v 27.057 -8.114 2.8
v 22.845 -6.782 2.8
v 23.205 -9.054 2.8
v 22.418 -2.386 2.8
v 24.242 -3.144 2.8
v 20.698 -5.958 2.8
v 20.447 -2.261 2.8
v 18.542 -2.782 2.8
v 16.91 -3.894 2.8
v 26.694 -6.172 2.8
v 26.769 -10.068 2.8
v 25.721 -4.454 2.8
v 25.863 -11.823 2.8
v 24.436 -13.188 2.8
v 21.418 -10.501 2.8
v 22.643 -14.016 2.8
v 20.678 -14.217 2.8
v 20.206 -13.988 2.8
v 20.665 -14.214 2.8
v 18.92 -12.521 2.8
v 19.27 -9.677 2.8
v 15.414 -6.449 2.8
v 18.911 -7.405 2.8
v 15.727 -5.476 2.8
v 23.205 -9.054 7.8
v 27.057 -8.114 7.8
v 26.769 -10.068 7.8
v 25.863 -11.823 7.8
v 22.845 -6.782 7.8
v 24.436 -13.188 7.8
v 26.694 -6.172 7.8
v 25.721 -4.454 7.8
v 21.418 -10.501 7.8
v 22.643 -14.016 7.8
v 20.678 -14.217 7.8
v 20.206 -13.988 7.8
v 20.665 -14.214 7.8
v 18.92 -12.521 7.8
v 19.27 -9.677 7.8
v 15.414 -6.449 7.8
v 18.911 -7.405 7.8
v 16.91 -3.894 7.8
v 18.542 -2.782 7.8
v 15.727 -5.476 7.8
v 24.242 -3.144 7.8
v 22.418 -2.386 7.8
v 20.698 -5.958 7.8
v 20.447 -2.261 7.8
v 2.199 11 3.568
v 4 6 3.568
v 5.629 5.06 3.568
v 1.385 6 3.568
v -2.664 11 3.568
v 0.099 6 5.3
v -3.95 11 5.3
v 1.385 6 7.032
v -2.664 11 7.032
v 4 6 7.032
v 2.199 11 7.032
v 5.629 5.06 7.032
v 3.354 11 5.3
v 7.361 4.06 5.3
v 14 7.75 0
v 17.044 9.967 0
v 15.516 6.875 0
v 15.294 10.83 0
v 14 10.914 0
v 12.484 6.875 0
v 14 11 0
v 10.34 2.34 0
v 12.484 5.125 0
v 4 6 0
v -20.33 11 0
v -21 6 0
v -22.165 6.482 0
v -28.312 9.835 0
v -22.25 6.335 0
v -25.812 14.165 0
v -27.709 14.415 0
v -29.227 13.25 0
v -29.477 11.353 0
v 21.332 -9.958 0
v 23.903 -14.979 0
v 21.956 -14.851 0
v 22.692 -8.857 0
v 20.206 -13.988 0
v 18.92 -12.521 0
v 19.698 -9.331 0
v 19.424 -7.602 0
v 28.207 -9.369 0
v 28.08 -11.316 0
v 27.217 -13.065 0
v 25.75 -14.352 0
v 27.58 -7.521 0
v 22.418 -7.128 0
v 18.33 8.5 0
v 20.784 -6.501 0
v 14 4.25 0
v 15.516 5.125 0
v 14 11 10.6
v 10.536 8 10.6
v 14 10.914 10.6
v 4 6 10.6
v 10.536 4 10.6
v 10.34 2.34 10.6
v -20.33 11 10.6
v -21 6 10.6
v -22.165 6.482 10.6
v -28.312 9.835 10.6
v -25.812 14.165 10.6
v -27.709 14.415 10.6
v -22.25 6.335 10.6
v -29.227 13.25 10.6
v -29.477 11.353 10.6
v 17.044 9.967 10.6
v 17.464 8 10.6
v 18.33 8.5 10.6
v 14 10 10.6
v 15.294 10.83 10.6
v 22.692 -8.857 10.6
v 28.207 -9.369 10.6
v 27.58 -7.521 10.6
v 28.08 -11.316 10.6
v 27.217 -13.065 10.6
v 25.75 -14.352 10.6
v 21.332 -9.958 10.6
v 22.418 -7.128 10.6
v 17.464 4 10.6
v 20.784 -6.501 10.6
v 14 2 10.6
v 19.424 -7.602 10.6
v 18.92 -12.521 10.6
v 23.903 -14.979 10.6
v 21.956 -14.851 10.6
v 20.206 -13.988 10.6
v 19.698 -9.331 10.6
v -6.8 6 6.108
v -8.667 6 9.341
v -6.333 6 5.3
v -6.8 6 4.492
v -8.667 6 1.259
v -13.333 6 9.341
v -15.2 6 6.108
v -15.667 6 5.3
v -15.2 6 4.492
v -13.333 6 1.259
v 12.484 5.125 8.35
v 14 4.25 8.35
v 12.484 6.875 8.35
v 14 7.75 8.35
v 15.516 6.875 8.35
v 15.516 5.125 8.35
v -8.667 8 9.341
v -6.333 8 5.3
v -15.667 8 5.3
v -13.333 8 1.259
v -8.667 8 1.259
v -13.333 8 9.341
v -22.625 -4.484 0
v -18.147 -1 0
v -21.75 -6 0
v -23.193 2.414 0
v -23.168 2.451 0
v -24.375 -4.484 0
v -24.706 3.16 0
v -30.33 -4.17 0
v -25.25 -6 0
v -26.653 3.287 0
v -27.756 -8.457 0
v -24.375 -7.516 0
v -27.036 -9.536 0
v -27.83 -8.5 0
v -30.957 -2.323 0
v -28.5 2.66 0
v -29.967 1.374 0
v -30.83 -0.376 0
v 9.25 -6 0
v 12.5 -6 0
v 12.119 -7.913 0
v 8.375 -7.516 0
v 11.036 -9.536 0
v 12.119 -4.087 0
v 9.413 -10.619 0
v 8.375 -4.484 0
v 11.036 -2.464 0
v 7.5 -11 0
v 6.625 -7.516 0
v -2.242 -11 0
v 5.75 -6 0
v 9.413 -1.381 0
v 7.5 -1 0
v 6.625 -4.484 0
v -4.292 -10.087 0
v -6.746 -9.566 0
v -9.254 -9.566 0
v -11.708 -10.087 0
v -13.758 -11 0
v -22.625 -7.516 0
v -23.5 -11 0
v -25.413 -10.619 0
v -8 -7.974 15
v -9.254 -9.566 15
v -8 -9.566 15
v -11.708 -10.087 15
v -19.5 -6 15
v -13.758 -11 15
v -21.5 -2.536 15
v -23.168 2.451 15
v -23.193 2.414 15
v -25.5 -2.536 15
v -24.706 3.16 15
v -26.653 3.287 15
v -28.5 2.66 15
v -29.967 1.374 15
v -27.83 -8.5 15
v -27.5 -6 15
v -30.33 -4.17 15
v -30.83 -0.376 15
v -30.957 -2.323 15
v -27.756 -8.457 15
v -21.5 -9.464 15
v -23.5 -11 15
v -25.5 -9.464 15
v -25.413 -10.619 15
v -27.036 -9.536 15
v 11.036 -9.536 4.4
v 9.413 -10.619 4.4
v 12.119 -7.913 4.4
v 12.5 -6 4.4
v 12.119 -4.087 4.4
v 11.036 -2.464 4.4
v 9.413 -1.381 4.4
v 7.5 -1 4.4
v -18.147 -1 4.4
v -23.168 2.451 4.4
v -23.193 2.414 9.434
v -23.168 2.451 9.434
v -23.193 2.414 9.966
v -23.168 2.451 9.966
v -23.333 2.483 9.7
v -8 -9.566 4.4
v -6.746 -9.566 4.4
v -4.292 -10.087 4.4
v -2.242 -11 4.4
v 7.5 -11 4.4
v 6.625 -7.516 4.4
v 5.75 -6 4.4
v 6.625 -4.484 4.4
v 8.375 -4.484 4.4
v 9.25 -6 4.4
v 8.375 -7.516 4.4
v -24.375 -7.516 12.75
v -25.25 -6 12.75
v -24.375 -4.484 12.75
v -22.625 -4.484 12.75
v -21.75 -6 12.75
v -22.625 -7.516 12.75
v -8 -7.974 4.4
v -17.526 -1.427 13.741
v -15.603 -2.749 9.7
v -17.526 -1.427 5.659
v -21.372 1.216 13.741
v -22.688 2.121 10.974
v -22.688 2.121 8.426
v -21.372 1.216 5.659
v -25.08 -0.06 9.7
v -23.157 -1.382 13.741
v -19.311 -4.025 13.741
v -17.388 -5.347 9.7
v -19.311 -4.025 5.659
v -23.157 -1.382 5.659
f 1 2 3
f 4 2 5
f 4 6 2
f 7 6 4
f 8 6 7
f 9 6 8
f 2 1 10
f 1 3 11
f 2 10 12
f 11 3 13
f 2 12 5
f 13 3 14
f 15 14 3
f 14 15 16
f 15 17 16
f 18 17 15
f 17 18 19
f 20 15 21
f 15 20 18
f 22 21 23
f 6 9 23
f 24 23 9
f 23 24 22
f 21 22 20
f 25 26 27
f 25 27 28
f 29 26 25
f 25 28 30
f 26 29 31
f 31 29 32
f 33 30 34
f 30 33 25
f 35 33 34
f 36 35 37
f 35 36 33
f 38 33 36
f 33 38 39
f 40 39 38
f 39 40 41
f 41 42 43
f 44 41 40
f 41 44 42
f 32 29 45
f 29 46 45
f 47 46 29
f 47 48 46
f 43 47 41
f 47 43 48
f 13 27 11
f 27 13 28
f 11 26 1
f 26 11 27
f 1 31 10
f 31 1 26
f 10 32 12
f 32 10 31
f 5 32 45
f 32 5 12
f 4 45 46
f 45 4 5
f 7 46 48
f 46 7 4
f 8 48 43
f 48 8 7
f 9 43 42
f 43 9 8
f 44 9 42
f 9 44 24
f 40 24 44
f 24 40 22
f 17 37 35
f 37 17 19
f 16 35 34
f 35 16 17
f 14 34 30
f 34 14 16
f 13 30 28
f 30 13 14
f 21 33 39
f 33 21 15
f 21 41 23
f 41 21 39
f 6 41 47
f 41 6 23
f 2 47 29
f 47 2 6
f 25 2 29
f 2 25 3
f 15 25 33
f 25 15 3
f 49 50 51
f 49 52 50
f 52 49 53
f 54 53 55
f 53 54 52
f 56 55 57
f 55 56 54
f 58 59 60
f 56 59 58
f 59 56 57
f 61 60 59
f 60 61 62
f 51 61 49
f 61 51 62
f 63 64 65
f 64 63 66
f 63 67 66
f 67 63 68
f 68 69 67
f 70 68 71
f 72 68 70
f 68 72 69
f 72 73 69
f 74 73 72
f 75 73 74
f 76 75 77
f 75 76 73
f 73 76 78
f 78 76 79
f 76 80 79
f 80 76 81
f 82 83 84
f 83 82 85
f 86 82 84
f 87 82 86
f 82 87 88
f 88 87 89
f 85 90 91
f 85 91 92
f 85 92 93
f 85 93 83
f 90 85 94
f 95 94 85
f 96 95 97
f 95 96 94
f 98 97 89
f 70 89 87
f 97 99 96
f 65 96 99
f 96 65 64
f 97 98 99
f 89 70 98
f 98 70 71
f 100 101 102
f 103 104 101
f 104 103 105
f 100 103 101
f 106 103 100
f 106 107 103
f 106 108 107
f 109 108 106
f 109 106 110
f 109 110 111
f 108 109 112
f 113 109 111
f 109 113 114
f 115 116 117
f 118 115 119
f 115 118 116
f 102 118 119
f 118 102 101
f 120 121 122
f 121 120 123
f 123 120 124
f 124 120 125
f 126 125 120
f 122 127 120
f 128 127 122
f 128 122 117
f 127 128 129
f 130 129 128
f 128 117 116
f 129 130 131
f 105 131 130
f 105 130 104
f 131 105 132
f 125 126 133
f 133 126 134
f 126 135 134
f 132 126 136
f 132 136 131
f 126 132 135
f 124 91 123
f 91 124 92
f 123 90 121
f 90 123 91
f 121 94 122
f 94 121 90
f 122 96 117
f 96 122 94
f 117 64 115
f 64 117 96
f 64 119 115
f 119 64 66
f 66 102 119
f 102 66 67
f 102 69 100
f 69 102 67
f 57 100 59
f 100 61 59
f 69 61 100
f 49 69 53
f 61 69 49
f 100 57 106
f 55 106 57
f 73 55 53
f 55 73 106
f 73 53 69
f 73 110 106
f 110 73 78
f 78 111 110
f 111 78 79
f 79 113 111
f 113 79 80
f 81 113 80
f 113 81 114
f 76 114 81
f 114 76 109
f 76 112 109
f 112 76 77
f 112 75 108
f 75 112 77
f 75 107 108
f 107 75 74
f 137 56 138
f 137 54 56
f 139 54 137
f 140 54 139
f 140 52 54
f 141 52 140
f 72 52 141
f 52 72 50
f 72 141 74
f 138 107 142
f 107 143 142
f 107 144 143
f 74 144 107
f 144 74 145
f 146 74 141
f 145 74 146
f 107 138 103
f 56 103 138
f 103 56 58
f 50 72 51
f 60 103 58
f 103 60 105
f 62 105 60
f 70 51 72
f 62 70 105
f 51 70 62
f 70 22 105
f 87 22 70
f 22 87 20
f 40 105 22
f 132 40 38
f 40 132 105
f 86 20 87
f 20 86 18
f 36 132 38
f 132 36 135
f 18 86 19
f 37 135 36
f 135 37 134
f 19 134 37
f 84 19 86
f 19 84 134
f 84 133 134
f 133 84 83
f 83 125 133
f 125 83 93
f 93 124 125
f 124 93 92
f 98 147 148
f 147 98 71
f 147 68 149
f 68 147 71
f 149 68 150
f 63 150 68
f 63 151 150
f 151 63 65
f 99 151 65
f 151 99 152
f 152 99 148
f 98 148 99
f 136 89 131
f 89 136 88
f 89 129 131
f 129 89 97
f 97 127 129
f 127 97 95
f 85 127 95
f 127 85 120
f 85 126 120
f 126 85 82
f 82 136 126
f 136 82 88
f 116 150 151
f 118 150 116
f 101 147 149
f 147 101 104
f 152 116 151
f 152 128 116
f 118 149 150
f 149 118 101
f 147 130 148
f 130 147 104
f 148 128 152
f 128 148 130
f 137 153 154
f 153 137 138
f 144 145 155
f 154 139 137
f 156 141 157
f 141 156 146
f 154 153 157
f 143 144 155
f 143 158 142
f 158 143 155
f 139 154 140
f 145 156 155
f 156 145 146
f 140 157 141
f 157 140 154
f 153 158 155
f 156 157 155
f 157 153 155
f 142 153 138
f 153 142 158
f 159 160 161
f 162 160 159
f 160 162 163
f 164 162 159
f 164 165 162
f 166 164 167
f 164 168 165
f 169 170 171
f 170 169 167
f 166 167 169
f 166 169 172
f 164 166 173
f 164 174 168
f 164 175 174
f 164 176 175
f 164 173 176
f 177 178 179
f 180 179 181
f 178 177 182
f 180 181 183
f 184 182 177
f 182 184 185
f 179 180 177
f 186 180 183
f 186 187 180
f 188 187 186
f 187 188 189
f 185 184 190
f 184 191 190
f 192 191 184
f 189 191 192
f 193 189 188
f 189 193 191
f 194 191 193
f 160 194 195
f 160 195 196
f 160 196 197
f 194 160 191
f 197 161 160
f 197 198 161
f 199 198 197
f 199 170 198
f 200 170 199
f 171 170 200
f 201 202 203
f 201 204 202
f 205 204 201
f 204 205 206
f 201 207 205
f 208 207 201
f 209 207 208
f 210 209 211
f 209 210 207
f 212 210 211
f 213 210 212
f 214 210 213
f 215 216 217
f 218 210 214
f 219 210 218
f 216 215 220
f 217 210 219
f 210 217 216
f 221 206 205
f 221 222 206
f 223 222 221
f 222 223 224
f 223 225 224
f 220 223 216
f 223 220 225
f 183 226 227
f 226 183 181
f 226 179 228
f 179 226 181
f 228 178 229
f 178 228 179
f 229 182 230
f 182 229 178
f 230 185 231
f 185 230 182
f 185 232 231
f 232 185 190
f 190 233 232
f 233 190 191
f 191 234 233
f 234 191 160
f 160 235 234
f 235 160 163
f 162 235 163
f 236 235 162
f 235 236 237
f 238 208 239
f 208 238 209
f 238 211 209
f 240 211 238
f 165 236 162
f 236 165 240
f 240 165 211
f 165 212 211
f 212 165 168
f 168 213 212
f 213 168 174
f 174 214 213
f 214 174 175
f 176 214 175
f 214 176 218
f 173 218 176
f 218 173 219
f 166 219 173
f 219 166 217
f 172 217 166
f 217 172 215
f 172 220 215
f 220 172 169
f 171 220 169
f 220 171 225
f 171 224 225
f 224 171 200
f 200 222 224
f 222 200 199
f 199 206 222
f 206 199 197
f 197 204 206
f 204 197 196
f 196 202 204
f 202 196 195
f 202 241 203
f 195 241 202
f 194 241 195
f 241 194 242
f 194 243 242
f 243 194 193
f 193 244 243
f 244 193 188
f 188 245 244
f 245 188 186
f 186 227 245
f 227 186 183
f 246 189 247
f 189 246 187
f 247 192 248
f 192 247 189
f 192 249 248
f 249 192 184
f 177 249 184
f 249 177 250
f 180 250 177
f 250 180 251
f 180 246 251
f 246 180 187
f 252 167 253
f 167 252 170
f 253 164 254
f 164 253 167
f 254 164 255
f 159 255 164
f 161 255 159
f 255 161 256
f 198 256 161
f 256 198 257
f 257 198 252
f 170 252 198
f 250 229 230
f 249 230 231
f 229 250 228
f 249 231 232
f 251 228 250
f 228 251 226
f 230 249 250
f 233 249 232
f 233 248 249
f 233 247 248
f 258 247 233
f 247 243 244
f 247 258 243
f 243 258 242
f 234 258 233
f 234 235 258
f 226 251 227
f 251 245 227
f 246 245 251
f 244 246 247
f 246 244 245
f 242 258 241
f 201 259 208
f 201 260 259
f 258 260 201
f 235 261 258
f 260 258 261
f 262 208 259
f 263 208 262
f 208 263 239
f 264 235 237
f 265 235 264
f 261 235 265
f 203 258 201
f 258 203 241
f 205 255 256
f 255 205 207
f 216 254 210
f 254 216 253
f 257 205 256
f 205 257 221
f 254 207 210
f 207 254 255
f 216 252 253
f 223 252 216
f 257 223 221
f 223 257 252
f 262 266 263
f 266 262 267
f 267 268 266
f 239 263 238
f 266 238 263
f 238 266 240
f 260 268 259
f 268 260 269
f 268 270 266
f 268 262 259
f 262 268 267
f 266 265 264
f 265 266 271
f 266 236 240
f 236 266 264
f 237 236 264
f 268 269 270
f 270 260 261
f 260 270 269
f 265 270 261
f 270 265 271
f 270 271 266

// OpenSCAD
// Minimalistic Mk7 replacement
// by Whosa whatsis
// http://www.thingiverse.com/thing:15718

filament_d = 1.75;
spring_d = 8;
countersink = true;

//!for (side = [0, 1]) mirror([0, side, 0]) translate([0, 16, 0])
!
//mirror([1, 0, 0]) //uncomment for reverse
union() {
	translate([14, 6, 0]) rotate(30) idler();
	translate([-8, -6, 0]) base();
}

%translate([0, 6.5, 9.65]) union() {
	rotate([0, 180, 0]) import("MP1703-MK7-Filament-Drive-Block-Back.stl", convexity = 5);
	import("MP1794-MK7-Filament-Drive-Block-Front.stl", convexity = 5);
}
translate([0, 15.5, 0]) base();
translate([15.5, 15.5, 0]) {
	%translate([-15.5, -15.5, 0]) translate([10.56 / 2 + 5 + filament_d, 0, 7.7]) linear_extrude(height = 4, convexity = 5) difference() {
		circle(5);
		circle(1.5, $fn = 6);
	}

	translate([0, 0, 9.4 - 5]) rotate(-9) idler();
}
%translate([0, 0, 2]) difference() {
	linear_extrude(height = 11, convexity = 5) difference() {
		circle(6.3);
		circle(2.5);
	}
	translate([0, 0, 7.7]) rotate_extrude(convexity = 5, $fs = 0.5) translate([5 + 2.5, 0, 0]) circle(r = 2);
}

module idler() difference() {
	linear_extrude(height = 10.6, convexity = 5) difference() {
		union() {
			circle(5);
			translate([0, -18.5, 0]) circle(5);
			rotate(180) translate([-5, 0, 0]) square([10, 18.5]);
			rotate(60) translate([0, 0, 0]) square([5, 35]);
			rotate(60) translate([2.5, 35, 0]) {
				circle(2.5);
				rotate(-30) {
					translate([-2.5, 0, 0]) square([5, 7]);
					translate([0, 7, 0]) circle(2.5);
				}
			}
			rotate(30) translate([-5, 0, 0]) square([5, 10]);
		}
		circle(3 * 7/12, $fn = 6);
		rotate(9) translate([-15.5 + 10.56 / 2 + 5 + filament_d, -15.5, 0]) circle(3 * 7/12, $fn = 6);
	}
	translate([0, 0, 5.3]) {
		rotate(9) translate([-15.5 + 10.56 / 2 + 5 + filament_d, -15.5, 0]) linear_extrude(height = 5, convexity = 5, center = true) difference() {
			circle(6);
			circle(2.3, $fn = 6);
		}
		translate([10.56 / 2 + 1.5, 0, 0]) rotate([-90, 0, 9]) translate([-15.5, 0, -15.5]) cylinder(r = 2, h = 50, $fn = 6);
		translate([10.56 / 2 + 1.5, 0, 0]) rotate([-90, 0, 0]) translate([-15.5, 0, -15.5]) rotate([0, 0, 0]) cylinder(r = 2, h = 100, center = true, $fn = 6);
	}
	if (countersink) translate([0, 0, 10.6 - 4]) cylinder(r1 = 0, r2 = 8, h = 8, $fn = 6);
	translate([0, 0, 10.6 / 2]) rotate([90, 0, -30]) translate([-25, 0, -2]) cylinder(r = spring_d * 7/12, h = 10, $fn = 6);
}

module base() difference() {
	linear_extrude(height = 15, convexity = 5) difference() {
		union() {
			square([31, 10], center = true);
			translate([-15.5, 0, 0]) rotate(120) {
				translate([0, -5, 0]) square([5, 10]);
				translate([5, 0, 0]) circle(5);
				translate([5, 0, 0]) rotate(-150 - 9 / 2) square([15, 5]);			
			}
			for (side = [1, -1]) translate([side * 15.5, 0, 0]) circle(5);
		}
		for (side = [1, -1]) translate([side * 15.5, 0, 0]) circle(3 * 7/12, $fn = 6);
		translate([0, -15.5, 0]) circle(12);
	}
	translate([0, 0, 4.4]) linear_extrude(height = 15, convexity = 5) {
		translate([-15.5, 0, 0]) rotate(30) translate([0, 5, 0]) rotate(-60 - 9 / 2) translate([-5, 5, 0]) square(100);
		translate([0, -10, 0]) square(100);
	}
	if (countersink) translate([-15.5, 0, 15 - 4]) cylinder(r1 = 0, r2 = 8, h = 8, $fn = 6);
	translate([-15.5, 0, 4.4 + 10.6 / 2]) rotate([90, 0, 150 - 4.5]) translate([0, 0, 4]) cylinder(r = spring_d * 7/12, h = 10, $fn = 6);
}
